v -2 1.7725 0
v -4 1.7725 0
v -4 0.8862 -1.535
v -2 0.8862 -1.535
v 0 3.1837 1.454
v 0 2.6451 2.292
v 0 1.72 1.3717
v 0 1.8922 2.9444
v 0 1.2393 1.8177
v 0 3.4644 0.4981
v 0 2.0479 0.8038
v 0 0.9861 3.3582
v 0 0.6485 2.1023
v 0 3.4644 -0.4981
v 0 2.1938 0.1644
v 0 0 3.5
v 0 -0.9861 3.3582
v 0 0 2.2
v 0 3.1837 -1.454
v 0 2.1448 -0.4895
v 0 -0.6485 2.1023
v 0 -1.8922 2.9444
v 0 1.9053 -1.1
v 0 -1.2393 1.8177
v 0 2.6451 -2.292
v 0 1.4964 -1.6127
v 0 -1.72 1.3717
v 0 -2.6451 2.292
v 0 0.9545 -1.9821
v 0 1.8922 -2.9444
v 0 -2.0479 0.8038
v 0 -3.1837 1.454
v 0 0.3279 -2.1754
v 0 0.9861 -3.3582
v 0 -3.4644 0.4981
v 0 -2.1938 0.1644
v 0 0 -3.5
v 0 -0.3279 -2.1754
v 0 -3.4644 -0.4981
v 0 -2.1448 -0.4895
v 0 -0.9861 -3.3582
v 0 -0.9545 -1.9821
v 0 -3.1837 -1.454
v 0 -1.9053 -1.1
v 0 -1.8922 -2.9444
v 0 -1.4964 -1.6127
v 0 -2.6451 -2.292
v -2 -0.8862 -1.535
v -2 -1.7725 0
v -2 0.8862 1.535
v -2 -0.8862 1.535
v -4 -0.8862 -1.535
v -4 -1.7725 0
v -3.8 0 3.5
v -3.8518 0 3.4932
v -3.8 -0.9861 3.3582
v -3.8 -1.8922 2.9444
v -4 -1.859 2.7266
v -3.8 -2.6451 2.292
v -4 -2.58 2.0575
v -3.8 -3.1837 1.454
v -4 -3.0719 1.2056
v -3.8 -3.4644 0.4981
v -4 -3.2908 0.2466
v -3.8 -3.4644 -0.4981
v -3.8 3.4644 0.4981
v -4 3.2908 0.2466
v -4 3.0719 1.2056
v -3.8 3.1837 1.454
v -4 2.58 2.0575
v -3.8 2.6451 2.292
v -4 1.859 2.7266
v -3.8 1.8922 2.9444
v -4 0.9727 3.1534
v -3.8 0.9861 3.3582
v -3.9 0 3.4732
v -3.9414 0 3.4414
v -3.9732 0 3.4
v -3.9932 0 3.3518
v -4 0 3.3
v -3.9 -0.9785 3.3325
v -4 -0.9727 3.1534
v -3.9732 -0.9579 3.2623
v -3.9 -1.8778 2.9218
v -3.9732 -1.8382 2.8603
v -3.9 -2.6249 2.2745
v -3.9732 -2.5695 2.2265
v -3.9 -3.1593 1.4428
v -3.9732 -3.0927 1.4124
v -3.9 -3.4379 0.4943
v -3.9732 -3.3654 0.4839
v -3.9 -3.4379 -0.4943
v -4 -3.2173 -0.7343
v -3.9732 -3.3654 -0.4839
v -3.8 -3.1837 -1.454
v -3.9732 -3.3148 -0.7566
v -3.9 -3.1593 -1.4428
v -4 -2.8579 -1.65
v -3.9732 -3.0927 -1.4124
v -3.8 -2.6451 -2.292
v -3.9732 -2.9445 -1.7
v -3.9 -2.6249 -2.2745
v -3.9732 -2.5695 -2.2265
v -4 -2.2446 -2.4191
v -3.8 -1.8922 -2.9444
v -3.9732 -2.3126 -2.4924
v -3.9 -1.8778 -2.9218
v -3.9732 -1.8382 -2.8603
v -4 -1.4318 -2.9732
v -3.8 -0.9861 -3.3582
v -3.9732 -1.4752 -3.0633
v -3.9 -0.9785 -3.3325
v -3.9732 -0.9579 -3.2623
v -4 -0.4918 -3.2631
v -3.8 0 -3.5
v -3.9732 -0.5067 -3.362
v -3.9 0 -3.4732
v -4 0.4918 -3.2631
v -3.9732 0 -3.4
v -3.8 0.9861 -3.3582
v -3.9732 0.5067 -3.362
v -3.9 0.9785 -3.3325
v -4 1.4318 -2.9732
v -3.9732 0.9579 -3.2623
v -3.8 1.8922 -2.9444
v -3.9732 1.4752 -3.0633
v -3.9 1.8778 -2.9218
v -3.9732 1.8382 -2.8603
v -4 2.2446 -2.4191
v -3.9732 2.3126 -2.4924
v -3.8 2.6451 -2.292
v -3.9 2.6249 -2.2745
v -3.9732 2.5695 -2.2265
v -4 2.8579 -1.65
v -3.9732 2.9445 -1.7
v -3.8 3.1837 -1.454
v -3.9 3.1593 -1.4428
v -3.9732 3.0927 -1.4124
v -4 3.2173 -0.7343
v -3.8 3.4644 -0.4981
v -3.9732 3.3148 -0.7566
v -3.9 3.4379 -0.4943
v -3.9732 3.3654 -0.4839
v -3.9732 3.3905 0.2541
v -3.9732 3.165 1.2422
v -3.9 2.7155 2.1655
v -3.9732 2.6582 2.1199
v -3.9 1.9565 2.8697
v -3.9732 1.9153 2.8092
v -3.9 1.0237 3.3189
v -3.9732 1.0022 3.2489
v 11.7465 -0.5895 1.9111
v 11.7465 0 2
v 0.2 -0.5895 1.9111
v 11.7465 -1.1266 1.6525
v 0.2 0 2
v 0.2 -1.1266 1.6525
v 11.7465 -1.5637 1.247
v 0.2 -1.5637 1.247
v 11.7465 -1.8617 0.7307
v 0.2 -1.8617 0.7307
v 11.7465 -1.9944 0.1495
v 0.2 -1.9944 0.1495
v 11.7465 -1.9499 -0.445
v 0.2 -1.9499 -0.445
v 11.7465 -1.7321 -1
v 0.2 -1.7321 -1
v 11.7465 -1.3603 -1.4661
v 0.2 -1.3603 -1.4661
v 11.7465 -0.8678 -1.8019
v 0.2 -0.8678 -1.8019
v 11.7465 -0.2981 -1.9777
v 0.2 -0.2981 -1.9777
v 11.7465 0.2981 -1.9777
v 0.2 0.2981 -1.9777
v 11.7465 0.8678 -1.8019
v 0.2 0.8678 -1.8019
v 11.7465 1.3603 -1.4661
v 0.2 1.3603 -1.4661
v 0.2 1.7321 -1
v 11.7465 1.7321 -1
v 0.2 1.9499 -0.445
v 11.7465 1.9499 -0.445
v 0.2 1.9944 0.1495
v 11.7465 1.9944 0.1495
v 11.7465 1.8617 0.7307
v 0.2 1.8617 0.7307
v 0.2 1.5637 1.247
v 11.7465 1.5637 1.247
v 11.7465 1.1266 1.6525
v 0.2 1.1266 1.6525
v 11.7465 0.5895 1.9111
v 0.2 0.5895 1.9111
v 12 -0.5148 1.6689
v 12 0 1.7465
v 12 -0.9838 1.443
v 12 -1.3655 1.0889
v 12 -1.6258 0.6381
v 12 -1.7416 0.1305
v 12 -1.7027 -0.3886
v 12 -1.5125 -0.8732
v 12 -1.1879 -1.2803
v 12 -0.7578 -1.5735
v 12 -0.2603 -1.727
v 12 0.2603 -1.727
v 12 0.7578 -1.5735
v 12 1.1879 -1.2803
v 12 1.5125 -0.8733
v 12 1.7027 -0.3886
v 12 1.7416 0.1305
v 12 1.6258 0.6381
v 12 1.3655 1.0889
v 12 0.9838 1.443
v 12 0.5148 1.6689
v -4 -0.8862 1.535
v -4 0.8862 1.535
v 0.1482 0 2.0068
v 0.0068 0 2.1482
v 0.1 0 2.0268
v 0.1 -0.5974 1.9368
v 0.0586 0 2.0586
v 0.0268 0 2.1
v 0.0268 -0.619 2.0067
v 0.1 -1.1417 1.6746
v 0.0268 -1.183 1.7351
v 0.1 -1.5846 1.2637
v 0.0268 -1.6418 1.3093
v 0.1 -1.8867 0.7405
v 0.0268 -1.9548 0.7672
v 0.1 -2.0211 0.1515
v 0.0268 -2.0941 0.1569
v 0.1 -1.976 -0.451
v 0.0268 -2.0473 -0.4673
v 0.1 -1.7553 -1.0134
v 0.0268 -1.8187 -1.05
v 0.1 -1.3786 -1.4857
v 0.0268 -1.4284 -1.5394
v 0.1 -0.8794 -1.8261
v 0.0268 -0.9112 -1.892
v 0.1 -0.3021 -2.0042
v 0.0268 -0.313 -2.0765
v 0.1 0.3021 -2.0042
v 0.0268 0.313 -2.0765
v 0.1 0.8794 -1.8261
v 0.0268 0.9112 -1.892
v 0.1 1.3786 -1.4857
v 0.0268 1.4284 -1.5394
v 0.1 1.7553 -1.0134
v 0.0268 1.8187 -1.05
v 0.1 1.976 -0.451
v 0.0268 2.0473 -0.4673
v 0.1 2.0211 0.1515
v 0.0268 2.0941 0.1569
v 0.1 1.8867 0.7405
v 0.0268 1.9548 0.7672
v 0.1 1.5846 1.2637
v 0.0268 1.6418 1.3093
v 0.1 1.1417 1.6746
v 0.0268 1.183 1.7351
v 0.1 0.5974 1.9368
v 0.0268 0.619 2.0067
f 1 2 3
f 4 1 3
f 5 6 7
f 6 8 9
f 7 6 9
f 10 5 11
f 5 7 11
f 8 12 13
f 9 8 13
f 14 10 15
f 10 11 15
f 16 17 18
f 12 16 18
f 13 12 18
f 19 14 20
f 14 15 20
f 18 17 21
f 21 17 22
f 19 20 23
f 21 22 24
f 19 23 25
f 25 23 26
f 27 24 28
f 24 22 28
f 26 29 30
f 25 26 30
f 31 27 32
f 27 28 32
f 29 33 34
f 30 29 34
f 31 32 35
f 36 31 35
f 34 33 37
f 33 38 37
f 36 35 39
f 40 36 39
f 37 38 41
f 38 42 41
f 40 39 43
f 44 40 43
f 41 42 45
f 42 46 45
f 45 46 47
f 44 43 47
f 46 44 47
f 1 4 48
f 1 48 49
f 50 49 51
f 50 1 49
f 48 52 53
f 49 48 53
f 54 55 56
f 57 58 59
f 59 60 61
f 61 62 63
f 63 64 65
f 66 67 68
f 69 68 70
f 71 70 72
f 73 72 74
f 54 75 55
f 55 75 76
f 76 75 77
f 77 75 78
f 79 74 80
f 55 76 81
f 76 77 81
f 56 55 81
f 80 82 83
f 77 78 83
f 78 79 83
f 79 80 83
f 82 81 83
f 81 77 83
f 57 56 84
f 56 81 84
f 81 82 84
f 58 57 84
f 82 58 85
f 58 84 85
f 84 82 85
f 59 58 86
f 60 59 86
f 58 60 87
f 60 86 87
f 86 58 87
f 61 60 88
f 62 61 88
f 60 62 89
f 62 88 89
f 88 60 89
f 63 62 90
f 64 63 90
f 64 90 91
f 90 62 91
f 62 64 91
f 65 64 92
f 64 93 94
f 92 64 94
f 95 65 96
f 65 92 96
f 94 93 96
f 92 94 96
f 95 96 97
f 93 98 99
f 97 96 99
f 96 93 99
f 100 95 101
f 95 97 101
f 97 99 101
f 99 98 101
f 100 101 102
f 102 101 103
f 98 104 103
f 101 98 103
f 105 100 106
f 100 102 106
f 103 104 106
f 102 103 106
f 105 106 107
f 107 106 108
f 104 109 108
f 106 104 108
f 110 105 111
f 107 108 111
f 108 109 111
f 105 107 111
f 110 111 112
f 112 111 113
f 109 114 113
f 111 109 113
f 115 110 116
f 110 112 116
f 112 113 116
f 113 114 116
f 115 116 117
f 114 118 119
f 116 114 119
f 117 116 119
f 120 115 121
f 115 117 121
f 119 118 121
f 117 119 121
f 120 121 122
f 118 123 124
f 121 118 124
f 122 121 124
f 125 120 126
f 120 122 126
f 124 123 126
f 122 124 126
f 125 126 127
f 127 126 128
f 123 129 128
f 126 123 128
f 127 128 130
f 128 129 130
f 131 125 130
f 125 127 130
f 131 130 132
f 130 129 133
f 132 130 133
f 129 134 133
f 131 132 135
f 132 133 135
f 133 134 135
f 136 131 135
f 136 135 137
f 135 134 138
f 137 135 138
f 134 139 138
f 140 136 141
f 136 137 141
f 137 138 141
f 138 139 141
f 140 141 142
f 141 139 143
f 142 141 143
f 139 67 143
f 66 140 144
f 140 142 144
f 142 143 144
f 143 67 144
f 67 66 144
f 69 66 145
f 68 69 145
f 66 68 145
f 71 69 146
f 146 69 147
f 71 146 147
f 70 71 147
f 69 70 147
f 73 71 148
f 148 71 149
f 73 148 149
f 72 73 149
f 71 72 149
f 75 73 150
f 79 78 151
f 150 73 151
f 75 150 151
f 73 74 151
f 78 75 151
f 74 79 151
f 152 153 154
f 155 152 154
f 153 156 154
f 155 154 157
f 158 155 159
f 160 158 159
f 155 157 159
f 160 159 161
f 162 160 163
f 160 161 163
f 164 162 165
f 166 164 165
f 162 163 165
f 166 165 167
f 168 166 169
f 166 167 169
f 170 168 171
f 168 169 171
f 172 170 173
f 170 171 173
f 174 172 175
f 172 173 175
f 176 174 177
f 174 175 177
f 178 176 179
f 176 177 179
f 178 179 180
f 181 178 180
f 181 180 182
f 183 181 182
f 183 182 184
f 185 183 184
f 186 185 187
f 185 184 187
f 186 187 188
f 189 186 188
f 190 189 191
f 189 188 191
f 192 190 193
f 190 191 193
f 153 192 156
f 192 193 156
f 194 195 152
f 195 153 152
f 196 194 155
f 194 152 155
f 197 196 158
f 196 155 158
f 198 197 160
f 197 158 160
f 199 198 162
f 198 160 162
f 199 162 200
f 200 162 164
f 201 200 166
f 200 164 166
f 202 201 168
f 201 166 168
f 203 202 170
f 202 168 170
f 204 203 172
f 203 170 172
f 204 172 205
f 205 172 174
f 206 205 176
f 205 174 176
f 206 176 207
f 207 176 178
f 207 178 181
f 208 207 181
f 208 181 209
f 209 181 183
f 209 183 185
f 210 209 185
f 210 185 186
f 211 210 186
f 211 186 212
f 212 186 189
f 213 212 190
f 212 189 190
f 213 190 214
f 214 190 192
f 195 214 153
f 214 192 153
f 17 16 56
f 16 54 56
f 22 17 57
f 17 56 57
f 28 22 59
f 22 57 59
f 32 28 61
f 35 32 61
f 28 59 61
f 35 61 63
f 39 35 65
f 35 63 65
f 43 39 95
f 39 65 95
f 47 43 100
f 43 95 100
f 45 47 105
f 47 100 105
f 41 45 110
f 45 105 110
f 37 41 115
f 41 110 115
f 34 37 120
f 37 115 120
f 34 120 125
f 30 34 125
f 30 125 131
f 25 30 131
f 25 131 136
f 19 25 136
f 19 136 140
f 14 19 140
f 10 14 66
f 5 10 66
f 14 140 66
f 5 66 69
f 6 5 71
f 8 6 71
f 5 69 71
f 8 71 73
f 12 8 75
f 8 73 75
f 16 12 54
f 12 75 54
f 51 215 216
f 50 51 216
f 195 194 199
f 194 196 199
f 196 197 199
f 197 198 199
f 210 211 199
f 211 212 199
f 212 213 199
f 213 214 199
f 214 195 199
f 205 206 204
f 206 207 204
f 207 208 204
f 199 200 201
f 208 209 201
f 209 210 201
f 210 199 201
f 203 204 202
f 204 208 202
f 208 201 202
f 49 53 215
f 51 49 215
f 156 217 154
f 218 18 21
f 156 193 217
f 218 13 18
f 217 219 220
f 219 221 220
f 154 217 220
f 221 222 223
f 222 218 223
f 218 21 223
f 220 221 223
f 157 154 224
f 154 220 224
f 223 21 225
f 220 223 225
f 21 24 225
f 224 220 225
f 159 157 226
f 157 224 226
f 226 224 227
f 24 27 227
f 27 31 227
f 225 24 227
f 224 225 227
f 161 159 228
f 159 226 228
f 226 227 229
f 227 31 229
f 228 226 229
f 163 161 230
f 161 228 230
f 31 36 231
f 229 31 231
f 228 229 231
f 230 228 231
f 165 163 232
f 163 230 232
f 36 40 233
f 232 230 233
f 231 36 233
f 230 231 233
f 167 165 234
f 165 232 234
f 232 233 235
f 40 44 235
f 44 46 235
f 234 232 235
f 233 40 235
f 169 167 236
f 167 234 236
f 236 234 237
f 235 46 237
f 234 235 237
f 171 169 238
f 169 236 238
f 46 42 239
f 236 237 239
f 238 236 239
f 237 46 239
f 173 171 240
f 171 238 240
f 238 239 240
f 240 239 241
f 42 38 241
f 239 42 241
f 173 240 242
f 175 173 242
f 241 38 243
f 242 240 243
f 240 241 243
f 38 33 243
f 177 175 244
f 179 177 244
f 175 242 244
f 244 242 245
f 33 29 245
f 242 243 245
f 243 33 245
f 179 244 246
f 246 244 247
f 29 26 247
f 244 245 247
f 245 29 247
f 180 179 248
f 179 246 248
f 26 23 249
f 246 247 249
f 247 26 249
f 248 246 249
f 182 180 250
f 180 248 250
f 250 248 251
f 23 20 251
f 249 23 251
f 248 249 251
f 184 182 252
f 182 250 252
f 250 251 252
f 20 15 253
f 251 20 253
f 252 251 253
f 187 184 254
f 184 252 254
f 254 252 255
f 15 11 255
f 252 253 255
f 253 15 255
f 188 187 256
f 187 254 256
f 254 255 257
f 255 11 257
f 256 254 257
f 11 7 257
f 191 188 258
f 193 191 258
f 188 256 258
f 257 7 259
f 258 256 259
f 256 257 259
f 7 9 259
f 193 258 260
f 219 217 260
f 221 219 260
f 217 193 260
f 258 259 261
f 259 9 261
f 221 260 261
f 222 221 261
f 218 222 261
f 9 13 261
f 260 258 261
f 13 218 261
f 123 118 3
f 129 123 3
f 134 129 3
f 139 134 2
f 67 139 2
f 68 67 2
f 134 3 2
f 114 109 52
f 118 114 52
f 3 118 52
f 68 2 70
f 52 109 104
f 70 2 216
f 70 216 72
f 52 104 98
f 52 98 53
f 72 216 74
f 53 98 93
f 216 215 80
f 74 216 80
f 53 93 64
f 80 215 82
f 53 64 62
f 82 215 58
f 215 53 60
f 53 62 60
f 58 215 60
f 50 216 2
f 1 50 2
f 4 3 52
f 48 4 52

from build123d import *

# Parameters (mm, degrees)
CUT_EXTRUDE1_DEPTH = 2


with BuildPart() as part:
    # Sketch1 → Revolve1 (revolve)
    with BuildSketch(Plane.XY, mode=Mode.PRIVATE) as revolve1_sk:
        with BuildLine():
            Line((11.7465, 2), (0.2, 2))
            ThreePointArc((0.2, 2), (0.058578644, 2.058578644), (0, 2.2))
            Line((0, 2.2), (0, 3.5))
            Line((0, 3.5), (-3.8, 3.5))
            ThreePointArc((-3.8, 3.5), (-3.941421356, 3.441421356), (-4, 3.3))
            Line((-4, 3.3), (-4, 0))
            Line((-4, 0), (12, 0))
            Line((12, 0), (12, 1.7465))
            Line((12, 1.7465), (11.7465, 2))
        make_face()
    revolve(revolve1_sk.sketch.rotate(Axis((-4, 0, 0), (1, 0, 0)), 90), axis=Axis((-4, 0, 0), (1, 0, 0)))

    # Sketch2 → Cut-Extrude1 (cut)
    with BuildSketch(Plane.ZY.offset(4)):
        Polygon((1.535, 0.886232663), (0, 1.772465326), (-1.535, 0.886232663), (-1.535, -0.886232663), (0, -1.772465326), (1.535, -0.886232663), align=None)
    extrude(amount=-CUT_EXTRUDE1_DEPTH, mode=Mode.SUBTRACT)


solid = part.part
